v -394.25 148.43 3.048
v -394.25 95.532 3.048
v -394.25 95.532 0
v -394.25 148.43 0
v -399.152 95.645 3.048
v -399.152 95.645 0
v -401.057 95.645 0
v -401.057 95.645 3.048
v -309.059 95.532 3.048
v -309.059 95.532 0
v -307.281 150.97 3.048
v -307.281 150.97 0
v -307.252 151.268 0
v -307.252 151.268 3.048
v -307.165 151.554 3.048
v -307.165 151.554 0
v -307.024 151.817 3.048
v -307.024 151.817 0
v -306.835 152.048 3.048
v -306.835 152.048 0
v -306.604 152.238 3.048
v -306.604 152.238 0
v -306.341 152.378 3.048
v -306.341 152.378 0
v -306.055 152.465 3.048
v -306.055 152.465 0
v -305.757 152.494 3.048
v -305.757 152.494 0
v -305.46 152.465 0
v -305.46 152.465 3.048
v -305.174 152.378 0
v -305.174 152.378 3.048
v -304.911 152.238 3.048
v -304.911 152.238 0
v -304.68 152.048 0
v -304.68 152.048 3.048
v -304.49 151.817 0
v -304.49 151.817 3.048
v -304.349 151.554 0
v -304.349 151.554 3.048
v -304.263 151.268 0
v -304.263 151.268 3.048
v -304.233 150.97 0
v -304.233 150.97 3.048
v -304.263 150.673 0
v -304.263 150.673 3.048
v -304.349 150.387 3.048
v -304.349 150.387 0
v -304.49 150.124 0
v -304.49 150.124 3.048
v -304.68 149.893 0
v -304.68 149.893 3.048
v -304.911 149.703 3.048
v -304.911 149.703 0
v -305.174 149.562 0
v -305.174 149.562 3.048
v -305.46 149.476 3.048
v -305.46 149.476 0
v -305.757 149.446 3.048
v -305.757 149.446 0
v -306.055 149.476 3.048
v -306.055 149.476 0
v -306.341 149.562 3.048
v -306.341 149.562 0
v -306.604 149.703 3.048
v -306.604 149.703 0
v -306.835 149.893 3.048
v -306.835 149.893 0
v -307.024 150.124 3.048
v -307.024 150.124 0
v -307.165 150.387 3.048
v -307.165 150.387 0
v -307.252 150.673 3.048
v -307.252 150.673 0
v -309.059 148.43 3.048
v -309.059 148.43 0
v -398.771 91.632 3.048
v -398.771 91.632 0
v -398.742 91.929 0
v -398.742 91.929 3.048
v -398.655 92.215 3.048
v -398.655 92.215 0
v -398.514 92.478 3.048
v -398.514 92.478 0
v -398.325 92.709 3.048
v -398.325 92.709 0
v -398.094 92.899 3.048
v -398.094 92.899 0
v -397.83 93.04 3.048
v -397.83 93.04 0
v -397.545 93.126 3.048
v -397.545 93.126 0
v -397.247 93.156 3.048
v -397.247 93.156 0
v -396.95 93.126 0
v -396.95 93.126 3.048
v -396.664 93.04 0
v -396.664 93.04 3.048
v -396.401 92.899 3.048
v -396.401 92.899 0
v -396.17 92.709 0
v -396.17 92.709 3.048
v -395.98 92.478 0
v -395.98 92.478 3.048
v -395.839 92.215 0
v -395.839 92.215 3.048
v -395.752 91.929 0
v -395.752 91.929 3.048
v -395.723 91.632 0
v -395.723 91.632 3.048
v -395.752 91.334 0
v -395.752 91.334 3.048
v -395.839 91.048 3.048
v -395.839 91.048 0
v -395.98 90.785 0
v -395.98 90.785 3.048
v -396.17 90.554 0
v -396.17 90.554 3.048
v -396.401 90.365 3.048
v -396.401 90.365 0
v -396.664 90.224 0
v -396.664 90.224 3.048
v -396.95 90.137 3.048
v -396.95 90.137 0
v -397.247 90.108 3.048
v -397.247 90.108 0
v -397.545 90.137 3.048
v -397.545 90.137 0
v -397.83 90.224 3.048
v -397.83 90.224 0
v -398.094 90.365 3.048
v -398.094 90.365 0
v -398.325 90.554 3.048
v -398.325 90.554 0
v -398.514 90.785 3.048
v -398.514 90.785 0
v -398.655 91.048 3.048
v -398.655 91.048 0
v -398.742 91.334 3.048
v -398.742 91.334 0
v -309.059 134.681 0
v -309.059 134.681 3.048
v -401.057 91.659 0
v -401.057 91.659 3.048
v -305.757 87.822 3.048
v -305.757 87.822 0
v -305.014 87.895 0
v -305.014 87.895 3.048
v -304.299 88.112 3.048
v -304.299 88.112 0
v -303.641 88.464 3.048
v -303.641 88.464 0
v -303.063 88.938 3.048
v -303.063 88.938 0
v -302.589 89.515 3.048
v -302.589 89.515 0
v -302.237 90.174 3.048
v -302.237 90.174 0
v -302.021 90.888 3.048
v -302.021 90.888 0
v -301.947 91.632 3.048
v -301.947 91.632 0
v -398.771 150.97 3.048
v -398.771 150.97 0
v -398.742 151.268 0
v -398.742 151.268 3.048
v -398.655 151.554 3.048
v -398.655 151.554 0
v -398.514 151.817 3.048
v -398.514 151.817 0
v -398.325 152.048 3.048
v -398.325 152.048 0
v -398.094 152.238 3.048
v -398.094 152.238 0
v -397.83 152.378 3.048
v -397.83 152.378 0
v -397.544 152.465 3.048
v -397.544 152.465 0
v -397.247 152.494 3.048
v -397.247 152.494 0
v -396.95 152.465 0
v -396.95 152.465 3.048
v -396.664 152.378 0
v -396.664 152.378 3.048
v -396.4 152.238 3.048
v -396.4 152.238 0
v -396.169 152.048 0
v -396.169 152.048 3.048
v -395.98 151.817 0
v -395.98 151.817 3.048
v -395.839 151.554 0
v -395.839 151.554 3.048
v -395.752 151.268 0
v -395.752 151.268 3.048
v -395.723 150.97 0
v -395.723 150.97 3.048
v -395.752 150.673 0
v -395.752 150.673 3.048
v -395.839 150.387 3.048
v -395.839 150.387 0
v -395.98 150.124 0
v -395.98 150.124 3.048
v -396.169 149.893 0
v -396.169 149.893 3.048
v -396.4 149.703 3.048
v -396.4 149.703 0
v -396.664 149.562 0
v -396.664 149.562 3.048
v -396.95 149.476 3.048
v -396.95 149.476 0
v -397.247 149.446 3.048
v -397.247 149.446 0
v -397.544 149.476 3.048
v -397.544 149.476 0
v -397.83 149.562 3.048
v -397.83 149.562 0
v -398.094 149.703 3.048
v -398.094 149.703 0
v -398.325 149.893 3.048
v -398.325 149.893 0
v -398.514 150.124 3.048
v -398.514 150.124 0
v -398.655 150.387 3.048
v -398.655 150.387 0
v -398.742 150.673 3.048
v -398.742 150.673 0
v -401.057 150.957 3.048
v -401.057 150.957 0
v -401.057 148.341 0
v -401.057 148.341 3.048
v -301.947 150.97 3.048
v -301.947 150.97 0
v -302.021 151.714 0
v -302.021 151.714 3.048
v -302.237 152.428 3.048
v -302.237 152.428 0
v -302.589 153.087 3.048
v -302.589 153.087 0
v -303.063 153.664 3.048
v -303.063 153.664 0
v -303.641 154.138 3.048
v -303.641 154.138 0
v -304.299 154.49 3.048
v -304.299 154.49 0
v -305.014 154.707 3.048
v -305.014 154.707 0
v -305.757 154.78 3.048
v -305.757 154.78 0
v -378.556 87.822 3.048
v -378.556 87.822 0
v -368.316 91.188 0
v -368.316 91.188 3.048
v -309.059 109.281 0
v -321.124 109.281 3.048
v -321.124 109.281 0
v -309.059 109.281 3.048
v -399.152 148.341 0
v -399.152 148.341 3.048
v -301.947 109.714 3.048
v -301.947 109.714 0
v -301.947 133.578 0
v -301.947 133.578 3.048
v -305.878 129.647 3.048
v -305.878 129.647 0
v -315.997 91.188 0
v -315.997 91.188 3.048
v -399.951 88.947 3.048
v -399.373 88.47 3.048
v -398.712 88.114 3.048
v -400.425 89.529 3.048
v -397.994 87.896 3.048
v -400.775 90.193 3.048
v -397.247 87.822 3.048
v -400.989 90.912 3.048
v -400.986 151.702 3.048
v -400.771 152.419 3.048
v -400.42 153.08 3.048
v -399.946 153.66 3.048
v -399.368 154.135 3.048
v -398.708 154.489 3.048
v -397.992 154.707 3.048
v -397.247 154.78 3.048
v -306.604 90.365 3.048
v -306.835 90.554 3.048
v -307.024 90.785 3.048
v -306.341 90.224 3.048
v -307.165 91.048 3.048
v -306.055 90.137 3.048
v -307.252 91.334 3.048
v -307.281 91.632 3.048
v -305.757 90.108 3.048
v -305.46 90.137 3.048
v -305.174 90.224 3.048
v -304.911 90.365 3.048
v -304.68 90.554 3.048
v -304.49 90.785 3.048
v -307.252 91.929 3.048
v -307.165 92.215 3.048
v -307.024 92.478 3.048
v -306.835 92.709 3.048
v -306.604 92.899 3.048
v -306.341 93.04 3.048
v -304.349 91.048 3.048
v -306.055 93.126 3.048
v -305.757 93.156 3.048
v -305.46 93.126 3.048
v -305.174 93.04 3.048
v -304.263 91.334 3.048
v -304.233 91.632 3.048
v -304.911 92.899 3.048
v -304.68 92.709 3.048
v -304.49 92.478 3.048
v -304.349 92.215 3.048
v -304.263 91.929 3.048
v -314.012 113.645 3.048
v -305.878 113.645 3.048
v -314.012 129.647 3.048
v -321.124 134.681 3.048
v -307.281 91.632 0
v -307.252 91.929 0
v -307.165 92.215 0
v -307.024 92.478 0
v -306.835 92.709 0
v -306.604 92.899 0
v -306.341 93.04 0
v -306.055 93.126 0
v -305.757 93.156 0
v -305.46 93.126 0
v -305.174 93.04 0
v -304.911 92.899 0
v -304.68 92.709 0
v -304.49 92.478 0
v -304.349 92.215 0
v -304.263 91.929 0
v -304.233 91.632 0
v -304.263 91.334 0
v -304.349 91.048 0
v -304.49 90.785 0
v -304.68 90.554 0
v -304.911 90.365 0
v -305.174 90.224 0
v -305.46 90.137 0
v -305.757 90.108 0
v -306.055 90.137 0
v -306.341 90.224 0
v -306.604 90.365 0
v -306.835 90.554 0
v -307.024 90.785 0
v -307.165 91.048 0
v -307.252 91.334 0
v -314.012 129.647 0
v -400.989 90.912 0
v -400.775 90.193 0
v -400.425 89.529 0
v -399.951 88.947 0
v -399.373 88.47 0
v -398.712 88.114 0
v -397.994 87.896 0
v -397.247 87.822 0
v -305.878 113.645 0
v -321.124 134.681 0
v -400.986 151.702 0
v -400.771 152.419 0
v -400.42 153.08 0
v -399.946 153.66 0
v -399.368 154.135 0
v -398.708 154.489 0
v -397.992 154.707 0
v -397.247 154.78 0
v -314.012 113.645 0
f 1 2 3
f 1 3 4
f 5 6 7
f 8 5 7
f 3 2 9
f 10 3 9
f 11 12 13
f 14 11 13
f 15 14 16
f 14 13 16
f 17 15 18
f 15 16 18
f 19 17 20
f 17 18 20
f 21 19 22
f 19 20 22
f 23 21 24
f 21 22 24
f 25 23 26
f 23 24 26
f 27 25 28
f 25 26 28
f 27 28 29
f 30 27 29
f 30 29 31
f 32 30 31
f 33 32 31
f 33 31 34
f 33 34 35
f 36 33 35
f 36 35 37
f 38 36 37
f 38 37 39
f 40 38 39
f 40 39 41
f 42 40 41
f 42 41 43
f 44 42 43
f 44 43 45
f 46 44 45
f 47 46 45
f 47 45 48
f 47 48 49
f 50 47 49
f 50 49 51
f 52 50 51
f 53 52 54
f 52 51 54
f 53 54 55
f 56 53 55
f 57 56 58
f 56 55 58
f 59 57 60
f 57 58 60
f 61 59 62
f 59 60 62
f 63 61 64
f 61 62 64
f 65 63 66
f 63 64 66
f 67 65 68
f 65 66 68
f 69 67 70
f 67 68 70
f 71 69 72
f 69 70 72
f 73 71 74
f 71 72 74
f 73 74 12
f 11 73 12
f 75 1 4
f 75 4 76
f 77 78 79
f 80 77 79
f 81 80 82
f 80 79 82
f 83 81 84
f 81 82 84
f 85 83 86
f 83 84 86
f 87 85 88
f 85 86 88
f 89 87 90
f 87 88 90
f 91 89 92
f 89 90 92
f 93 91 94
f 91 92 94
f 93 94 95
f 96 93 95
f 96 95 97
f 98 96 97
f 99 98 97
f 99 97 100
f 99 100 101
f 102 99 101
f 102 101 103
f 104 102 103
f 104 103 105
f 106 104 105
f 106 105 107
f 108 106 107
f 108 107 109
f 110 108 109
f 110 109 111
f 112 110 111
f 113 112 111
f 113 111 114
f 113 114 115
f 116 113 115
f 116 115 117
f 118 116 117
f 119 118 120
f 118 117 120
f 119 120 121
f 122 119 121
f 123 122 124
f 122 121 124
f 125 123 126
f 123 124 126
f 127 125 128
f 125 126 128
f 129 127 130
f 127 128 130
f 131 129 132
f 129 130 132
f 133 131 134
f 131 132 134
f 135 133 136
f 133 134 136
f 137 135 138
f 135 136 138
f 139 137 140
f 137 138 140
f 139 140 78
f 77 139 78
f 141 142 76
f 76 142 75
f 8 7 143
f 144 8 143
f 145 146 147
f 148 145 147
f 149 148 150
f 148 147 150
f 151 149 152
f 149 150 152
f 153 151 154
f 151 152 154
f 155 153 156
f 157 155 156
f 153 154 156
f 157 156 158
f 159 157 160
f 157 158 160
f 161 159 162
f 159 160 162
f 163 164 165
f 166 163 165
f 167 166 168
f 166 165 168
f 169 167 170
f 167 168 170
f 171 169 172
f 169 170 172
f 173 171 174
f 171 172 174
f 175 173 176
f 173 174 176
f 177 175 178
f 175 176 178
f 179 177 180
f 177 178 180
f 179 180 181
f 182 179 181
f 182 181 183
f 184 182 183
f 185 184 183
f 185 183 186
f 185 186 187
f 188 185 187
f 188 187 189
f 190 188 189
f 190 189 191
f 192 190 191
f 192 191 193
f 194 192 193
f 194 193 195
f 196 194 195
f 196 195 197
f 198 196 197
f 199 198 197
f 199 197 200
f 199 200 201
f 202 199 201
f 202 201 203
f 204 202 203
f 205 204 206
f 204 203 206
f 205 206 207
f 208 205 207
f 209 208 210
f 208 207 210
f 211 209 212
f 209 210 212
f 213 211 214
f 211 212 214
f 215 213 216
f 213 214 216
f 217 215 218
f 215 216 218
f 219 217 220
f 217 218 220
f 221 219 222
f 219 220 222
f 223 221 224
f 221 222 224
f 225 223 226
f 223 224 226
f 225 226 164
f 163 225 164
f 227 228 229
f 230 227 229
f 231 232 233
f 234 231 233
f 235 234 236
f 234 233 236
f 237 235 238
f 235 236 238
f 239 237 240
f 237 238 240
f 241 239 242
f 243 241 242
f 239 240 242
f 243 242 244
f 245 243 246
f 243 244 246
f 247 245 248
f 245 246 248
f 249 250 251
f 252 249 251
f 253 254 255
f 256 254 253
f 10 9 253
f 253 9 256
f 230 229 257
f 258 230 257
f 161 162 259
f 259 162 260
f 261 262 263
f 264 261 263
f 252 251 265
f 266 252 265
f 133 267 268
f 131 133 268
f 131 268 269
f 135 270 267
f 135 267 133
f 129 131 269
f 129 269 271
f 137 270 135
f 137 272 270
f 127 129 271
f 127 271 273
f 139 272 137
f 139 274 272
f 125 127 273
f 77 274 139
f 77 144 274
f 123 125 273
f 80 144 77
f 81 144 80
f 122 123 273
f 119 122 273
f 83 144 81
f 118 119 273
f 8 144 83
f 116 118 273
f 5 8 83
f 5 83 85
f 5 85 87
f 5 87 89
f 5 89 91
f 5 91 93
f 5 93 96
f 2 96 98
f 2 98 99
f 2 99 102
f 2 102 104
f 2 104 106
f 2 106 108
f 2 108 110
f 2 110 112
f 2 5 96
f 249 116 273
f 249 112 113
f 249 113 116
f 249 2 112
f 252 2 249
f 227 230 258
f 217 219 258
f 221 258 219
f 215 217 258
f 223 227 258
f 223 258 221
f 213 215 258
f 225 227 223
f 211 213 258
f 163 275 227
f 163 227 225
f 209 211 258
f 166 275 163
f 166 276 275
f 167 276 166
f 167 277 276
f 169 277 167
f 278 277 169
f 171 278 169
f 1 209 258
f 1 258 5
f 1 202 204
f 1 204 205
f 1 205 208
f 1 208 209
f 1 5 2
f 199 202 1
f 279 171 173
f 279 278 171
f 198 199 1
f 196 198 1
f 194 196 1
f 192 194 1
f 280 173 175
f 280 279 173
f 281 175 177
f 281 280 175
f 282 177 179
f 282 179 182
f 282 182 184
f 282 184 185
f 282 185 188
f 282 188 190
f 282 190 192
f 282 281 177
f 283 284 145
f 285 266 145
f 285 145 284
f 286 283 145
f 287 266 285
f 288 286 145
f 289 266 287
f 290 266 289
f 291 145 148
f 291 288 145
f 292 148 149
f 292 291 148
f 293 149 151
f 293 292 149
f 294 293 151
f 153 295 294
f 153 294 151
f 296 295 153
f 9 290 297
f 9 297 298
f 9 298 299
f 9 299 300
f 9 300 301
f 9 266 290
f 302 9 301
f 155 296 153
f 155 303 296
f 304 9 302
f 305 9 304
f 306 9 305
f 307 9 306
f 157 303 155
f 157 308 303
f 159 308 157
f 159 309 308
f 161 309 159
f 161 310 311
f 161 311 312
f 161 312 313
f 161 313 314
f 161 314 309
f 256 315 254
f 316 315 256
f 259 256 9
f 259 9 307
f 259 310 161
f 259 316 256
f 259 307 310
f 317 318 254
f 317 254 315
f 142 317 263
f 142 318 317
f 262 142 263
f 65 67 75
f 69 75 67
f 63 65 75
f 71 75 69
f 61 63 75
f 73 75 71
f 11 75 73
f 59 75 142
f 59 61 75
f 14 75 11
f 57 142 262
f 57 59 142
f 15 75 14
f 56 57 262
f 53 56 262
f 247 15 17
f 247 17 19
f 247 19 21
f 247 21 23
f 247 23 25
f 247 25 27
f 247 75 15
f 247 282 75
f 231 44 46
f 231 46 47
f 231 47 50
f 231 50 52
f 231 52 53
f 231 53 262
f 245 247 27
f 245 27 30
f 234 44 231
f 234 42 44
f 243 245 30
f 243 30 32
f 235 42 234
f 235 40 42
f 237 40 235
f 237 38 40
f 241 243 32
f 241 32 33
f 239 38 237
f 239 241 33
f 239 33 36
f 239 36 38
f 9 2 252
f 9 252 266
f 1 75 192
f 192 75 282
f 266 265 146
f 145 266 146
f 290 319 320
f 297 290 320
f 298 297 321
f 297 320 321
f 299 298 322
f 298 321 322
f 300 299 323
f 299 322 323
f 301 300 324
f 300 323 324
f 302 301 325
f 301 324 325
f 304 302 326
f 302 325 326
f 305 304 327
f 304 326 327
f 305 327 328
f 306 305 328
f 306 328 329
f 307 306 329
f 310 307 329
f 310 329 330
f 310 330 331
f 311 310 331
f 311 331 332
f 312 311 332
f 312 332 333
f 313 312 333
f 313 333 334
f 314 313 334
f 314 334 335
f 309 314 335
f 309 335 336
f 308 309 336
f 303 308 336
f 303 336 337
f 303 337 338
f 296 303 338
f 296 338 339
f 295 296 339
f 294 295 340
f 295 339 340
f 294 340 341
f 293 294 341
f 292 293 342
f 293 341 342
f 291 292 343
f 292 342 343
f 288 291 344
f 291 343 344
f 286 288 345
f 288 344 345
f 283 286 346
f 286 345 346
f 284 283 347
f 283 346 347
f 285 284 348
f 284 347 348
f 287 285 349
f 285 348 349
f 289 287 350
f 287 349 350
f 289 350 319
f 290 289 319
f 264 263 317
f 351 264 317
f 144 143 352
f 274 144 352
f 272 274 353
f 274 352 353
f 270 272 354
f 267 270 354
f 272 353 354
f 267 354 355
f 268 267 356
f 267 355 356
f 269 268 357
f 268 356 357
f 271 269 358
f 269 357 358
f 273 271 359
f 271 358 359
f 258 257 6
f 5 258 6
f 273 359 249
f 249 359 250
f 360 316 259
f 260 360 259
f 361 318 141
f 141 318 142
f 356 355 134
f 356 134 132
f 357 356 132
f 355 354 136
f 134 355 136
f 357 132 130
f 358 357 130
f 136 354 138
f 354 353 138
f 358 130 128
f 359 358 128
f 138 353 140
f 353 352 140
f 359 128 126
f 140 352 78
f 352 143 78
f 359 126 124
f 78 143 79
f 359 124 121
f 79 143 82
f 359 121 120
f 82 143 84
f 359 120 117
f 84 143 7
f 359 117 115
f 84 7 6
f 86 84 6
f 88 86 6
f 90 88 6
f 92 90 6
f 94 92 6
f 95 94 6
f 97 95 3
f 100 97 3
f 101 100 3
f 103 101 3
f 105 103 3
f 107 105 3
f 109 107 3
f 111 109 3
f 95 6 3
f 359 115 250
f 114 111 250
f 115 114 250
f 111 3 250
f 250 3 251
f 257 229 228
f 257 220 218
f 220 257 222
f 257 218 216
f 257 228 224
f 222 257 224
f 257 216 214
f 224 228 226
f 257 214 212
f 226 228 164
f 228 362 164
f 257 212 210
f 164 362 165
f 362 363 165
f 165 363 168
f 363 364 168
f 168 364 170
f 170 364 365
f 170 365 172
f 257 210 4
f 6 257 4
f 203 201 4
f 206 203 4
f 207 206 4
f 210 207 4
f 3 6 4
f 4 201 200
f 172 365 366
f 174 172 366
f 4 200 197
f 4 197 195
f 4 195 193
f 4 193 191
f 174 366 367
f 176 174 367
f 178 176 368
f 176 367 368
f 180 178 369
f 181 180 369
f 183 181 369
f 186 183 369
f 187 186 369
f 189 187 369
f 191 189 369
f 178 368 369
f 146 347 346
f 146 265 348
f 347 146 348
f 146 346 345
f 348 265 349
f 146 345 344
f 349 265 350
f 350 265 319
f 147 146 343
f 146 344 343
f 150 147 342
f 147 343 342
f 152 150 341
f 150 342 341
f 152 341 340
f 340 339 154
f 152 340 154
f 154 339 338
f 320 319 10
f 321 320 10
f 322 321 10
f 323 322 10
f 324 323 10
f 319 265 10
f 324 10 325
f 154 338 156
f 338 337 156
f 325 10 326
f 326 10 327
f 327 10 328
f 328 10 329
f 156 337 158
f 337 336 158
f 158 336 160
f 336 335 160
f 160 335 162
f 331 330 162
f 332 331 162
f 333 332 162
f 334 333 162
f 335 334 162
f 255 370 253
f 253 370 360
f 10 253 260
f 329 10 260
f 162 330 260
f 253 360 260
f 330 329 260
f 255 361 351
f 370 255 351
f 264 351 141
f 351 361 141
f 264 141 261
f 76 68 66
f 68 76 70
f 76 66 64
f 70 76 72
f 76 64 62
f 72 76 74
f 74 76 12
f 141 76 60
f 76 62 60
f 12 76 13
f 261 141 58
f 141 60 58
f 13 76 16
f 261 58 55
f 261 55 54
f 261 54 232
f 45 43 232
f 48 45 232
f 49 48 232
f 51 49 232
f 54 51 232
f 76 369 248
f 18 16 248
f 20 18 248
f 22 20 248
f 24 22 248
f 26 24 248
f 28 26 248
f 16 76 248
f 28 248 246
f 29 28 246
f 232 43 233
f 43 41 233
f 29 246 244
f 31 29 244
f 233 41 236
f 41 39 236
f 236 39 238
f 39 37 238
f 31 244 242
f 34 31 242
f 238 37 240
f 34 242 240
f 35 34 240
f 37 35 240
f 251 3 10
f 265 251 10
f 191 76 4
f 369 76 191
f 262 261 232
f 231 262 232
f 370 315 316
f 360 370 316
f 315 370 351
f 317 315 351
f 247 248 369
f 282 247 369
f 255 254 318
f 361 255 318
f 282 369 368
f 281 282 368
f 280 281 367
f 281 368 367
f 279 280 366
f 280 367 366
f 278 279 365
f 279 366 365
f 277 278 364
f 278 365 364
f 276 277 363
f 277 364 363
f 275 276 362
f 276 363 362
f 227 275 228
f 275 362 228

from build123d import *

# Parameters (mm, degrees)
BOSS_EXTRUDE1_DEPTH = 3.048
SKETCH2_R           = 1.355900406
CUT_EXTRUDE1_DEPTH  = 4.048
SKETCH3_R           = 1.524
CUT_EXTRUDE2_DEPTH  = 4.048
CUT_EXTRUDE3_DEPTH  = 4.048
BOSS_EXTRUDE2_DEPTH = 3.048
SKETCH5_W           = 73.1256
SKETCH5_H           = 52.8987
SKETCH5_W_2         = 9.017
SKETCH5_H_2         = 13.74935
CUT_EXTRUDE4_DEPTH  = 4.048
SKETCH6_W           = 3.048
SKETCH6_H           = 13.74935
CUT_EXTRUDE5_DEPTH  = 4.048


with BuildPart() as part:
    # Sketch1 → Boss-Extrude1 (new body)
    with BuildSketch(Plane.XY):
        with BuildLine():
            Line((-309.8086, 128.8851), (-305.87795, 128.8851))
            Line((-305.87795, 128.8851), (-301.9473, 132.81575))
            Line((-301.9473, 132.81575), (-301.9473, 150.9704))
            ThreePointArc((-301.9473, 150.9704), (-303.063223164, 153.664476836), (-305.7573, 154.7804))
            Line((-305.7573, 154.7804), (-397.247125, 154.7804))
            ThreePointArc((-397.247125, 154.7804), (-399.946077222, 153.659592612), (-401.0571, 150.956597849))
            Line((-401.0571, 150.956597849), (-401.0571, 148.341))
            Line((-401.0571, 148.341), (-399.1521, 148.341))
            Line((-399.1521, 148.341), (-399.1521, 95.6449))
            Line((-399.1521, 95.6449), (-401.0571, 95.6449))
            Line((-401.0571, 95.6449), (-401.0571, 91.659304166))
            ThreePointArc((-401.0571, 91.659304166), (-399.951018769, 88.947400452), (-397.2472, 87.8217))
            Line((-397.2472, 87.8217), (-378.5565, 87.8217))
            Line((-378.5565, 87.8217), (-368.3165, 91.1883))
            Line((-368.3165, 91.1883), (-315.9973, 91.1883))
            Line((-315.9973, 91.1883), (-305.7573, 87.8217))
            ThreePointArc((-305.7573, 87.8217), (-303.063223164, 88.937623164), (-301.9473, 91.6317))
            Line((-301.9473, 91.6317), (-301.9473, 111.74645))
            Line((-301.9473, 111.74645), (-305.87795, 115.6771))
            Line((-305.87795, 115.6771), (-309.8086, 115.6771))
            Line((-309.8086, 115.6771), (-314.0123, 115.6771))
            Line((-314.0123, 115.6771), (-314.0123, 128.8851))
            Line((-314.0123, 128.8851), (-309.8086, 128.8851))
        make_face()
        Polygon((-395.3675, 92.9525), (-395.3675, 149.2432), (-309.8086, 149.2432), (-309.8086, 132.81575), (-318.2033, 132.81575), (-318.2033, 111.74645), (-309.8086, 111.74645), (-309.8086, 92.9525), align=None, mode=Mode.SUBTRACT)
    extrude(amount=BOSS_EXTRUDE1_DEPTH)

    # Sketch2 → Cut-Extrude1 (cut, through all)
    with BuildSketch(Plane(origin=(0, 0, 0), x_dir=(-1, 0, 0), z_dir=(0, 0, -1))):
        with Locations((305.7573, 150.9704)):
            Circle(SKETCH2_R)
        with Locations((397.247125, 150.9704)):
            Circle(SKETCH2_R)
        with Locations((397.2472, 91.6317)):
            Circle(SKETCH2_R)
        with Locations((305.7573, 91.6317)):
            Circle(SKETCH2_R)
    extrude(amount=-CUT_EXTRUDE1_DEPTH, mode=Mode.SUBTRACT)

    # Sketch3 → Cut-Extrude2 (cut, through all)
    with BuildSketch(Plane(origin=(0, 0, 0), x_dir=(-1, 0, 0), z_dir=(0, 0, -1))):
        with Locations((305.7573, 150.9704)):
            Circle(SKETCH3_R)
        with Locations((397.247125, 150.9704)):
            Circle(SKETCH3_R)
        with Locations((397.2472, 91.6317)):
            Circle(SKETCH3_R)
        with Locations((305.7573, 91.6317)):
            Circle(SKETCH3_R)
    extrude(amount=-CUT_EXTRUDE2_DEPTH, mode=Mode.SUBTRACT)

    # Sketch4 → Cut-Extrude3 (cut, through all)
    with BuildSketch(Plane.XY.offset(3.048)):
        Polygon((-301.9473, 133.57775), (-305.87795, 129.6471), (-314.0123, 129.6471), (-314.0123, 113.6451), (-305.87795, 113.6451), (-301.9473, 109.71445), align=None)
    extrude(amount=-CUT_EXTRUDE3_DEPTH, mode=Mode.SUBTRACT)

    # Sketch4<4> → Boss-Extrude2 (add)
    with BuildSketch(Plane.XY.offset(3.048)):
        Polygon((-318.2033, 111.74645), (-318.2033, 132.81575), (-309.8086, 132.81575), (-309.8086, 149.2432), (-395.3675, 149.2432), (-395.3675, 92.9525), (-309.8086, 92.9525), (-309.8086, 111.74645), align=None)
    extrude(amount=-BOSS_EXTRUDE2_DEPTH)

    # Sketch5 → Cut-Extrude4 (cut, through all)
    with BuildSketch(Plane.XY.offset(3.048)):
        with Locations((-357.6871, 121.98105)):
            Rectangle(SKETCH5_W, SKETCH5_H)
        with Locations((-316.6158, 141.555725)):
            Rectangle(SKETCH5_W_2, SKETCH5_H_2)
        with Locations((-316.6158, 102.406375)):
            Rectangle(SKETCH5_W_2, SKETCH5_H_2)
    extrude(amount=-CUT_EXTRUDE4_DEPTH, mode=Mode.SUBTRACT)

    # Sketch6 → Cut-Extrude5 (cut, through all)
    with BuildSketch(Plane.XY.offset(3.048)):
        with Locations((-310.5833, 141.555725)):
            Rectangle(SKETCH6_W, SKETCH6_H)
        with Locations((-310.5833, 102.406375)):
            Rectangle(SKETCH6_W, SKETCH6_H)
    extrude(amount=-CUT_EXTRUDE5_DEPTH, mode=Mode.SUBTRACT)


solid = part.part
